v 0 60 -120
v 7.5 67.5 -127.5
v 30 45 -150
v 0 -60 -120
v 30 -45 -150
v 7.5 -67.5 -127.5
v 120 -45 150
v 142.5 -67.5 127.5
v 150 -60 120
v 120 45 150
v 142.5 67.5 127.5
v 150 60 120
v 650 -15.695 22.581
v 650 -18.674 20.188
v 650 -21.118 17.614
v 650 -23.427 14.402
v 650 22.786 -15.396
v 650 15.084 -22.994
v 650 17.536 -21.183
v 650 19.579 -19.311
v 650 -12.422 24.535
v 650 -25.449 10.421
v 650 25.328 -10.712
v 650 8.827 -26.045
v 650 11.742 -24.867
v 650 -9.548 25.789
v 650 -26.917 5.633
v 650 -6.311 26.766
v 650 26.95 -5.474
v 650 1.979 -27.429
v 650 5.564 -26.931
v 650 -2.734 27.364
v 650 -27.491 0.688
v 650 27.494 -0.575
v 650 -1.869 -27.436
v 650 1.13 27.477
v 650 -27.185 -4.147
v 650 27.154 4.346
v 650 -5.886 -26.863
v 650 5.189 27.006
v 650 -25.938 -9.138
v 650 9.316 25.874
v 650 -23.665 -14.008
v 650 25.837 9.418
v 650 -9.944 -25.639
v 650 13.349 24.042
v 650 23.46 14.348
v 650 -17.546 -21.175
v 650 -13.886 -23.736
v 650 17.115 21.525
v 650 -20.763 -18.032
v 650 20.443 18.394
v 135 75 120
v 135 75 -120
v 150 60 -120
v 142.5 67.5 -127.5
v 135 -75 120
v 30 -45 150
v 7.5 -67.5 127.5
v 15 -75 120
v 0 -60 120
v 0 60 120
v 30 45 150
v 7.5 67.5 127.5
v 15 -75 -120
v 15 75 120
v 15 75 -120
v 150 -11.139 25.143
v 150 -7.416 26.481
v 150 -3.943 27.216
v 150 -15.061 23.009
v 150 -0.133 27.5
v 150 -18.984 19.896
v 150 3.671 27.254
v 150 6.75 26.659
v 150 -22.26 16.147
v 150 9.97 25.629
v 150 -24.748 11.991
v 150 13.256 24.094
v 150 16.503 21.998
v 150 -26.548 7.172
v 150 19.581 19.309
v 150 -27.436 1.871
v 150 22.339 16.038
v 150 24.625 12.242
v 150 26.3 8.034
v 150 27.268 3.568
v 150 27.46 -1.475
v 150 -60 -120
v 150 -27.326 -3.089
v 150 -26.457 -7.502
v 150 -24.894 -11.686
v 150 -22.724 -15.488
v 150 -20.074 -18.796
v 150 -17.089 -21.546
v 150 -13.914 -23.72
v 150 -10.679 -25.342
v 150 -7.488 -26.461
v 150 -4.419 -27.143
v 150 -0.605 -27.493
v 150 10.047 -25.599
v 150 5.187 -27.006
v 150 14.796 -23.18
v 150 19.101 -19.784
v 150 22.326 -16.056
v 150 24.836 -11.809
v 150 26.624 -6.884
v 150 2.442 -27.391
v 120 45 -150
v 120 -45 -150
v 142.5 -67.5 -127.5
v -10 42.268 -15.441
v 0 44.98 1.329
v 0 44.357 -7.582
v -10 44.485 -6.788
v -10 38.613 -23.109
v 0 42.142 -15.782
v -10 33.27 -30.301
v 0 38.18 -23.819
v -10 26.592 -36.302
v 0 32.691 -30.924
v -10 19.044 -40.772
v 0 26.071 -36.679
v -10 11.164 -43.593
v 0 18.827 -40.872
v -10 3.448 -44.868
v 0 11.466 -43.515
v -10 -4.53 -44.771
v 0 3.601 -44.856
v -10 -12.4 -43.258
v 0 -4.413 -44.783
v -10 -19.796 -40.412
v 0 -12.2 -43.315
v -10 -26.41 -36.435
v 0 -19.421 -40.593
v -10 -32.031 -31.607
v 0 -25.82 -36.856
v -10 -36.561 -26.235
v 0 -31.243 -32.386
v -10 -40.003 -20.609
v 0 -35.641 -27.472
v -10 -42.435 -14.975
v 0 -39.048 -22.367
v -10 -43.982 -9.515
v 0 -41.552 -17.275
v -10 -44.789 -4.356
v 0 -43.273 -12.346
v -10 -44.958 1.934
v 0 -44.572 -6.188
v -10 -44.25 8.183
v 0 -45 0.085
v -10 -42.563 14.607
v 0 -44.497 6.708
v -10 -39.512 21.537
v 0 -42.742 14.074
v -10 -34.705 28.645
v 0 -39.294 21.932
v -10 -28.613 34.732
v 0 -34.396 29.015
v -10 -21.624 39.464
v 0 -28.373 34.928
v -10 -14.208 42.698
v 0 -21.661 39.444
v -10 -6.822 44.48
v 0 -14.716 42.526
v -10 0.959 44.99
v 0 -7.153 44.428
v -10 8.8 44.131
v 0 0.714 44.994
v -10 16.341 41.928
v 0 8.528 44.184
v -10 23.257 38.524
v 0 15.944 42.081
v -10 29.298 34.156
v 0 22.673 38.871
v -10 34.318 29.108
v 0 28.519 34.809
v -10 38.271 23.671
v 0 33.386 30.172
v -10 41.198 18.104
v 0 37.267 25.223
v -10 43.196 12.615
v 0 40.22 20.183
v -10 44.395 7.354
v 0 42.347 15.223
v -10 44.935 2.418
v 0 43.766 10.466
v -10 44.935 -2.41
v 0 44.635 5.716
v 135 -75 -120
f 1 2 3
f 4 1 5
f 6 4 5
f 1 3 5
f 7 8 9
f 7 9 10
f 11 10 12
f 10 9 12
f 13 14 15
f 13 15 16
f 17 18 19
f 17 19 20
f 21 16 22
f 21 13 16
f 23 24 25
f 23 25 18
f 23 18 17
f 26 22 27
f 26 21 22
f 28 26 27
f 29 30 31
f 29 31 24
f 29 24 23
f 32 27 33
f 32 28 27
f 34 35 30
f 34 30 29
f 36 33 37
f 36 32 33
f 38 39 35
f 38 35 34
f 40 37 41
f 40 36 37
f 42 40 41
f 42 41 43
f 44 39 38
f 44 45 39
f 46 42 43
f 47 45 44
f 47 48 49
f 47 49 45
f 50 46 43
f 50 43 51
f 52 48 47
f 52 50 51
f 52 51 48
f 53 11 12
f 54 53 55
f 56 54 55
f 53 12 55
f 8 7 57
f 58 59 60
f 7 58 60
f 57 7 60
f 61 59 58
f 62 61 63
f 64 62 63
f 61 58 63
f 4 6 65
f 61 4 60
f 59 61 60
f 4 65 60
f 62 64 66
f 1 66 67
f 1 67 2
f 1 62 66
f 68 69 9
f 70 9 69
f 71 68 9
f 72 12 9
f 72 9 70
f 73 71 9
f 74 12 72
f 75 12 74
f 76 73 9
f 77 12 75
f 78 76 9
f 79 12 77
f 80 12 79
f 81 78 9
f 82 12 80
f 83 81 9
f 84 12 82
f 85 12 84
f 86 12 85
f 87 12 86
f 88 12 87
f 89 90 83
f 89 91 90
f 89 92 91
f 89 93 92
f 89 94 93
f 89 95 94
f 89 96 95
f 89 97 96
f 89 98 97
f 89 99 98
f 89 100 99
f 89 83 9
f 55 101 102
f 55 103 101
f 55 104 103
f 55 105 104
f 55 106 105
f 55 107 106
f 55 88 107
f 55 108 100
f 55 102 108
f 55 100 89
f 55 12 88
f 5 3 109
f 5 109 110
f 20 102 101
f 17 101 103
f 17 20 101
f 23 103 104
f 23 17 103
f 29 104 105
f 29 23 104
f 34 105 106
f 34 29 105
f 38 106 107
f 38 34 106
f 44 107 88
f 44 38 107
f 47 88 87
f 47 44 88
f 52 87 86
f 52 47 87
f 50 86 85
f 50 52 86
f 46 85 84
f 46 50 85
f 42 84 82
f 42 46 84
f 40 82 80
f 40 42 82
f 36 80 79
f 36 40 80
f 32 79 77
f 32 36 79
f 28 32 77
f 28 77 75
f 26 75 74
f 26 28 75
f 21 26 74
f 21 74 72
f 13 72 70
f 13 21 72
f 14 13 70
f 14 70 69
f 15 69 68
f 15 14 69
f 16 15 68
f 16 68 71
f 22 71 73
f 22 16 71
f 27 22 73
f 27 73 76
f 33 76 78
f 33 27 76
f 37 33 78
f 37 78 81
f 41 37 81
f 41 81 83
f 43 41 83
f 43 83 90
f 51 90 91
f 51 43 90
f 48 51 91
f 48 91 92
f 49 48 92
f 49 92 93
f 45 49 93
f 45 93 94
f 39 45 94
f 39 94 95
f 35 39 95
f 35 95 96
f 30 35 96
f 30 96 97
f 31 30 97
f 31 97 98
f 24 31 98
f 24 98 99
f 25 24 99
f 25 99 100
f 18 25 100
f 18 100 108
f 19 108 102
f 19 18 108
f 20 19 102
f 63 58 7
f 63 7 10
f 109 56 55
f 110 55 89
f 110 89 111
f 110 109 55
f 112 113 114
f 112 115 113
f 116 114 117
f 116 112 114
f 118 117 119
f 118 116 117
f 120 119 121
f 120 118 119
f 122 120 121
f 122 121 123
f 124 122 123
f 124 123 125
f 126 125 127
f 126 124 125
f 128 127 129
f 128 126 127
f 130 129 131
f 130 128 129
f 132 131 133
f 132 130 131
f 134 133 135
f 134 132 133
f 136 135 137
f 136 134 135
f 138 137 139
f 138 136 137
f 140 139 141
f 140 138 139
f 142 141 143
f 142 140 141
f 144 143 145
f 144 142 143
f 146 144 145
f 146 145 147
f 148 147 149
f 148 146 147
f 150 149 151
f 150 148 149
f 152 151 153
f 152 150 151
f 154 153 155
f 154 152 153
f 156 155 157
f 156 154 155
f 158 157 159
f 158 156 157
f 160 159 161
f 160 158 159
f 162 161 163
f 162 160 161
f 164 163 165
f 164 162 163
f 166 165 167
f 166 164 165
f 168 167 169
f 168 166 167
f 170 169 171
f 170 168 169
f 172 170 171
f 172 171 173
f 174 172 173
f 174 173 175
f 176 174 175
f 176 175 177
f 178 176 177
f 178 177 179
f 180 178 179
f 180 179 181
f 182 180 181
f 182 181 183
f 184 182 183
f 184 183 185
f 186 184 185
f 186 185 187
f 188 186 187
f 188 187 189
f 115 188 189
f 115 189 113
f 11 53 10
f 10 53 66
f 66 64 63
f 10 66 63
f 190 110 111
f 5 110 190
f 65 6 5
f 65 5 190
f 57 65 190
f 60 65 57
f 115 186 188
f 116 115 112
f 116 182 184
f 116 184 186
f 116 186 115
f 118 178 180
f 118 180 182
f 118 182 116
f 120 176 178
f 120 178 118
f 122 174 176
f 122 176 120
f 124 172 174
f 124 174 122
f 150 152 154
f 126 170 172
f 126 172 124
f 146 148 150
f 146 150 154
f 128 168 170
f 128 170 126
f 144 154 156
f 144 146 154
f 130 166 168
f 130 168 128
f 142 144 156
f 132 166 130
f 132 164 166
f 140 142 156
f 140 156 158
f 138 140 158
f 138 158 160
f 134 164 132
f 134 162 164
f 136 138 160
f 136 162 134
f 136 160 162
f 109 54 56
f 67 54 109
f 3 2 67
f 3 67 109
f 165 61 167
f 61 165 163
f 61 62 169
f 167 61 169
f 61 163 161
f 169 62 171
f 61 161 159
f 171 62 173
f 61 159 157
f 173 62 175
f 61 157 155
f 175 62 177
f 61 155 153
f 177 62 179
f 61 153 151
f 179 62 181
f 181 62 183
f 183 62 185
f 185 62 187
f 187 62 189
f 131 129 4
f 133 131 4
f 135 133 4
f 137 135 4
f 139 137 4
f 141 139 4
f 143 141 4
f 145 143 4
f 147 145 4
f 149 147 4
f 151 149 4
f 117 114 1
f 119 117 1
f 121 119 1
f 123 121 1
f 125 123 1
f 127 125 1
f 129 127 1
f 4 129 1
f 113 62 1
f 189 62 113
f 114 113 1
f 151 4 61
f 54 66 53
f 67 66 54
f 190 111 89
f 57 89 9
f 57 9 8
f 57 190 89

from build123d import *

# Parameters (mm, degrees)
CHAFL_N2_SIZE = 30
CHAFL_N3_SIZE = 30
CHAFL_N4_SIZE = 30
CHAFL_N5_SIZE = 15


with BuildPart() as part:
    # Croquis3 → Recubrir1 section 0
    with BuildSketch(Plane(origin=(150, 0, 0), x_dir=(0, 0, -1), z_dir=(1, 0, 0))):
        with BuildLine():
            Line((-150, 75), (150, 75))
            Line((150, 75), (150, -75))
            Line((150, -75), (-150, -75))
            Line((-150, -75), (-150, 75))
        make_face()
    # Croquis2 → Recubrir1 section 1
    with BuildSketch(Plane(origin=(0, 0, 0), x_dir=(0, 0, -1), z_dir=(1, 0, 0))):
        with BuildLine():
            Line((-150, 75), (150, 75))
            Line((150, 75), (150, -75))
            Line((150, -75), (-150, -75))
            Line((-150, -75), (-150, 75))
        make_face()
    loft()

    # Recubrir2: read off the stored shape, not the designer's step
    # Recubrir2: loft between two sections, ruled curve by curve
    recubrir2_from = [
        Edge.make_bspline([(150, 5.186927484, -27.006402635), (150, 59.199732754, -16.632547667), (150, 48.825877786, 37.380257603), (150, -5.186927484, 27.006402635), (150, -59.199732754, 16.632547667), (150, -48.825877786, -37.380257603), (150, 5.186927484, -27.006402635)], [0, 0, 0, 0, 0.5, 0.5, 0.5, 1, 1, 1, 1], 3, [1, 0.333333333, 0.333333333, 1, 0.333333333, 0.333333333, 1]),
    ]
    recubrir2_to = [
        Edge.make_bspline([(650, 19.57936818, -19.310575902), (650, 58.200519984, 19.848160458), (650, 19.041783624, 58.469312262), (650, -19.57936818, 19.310575902), (650, -58.200519984, -19.848160458), (650, -19.041783624, -58.469312262), (650, 19.57936818, -19.310575902)], [0, 0, 0, 0, 0.5, 0.5, 0.5, 1, 1, 1, 1], 3, [1, 0.333333333, 0.333333333, 1, 0.333333333, 0.333333333, 1]),
    ]
    recubrir2 = Solid(Shell([*[Face.make_surface_from_curves(recubrir2_from[k], recubrir2_to[k]) for k in range(1)], Face(Wire(recubrir2_from)), Face(Wire(recubrir2_to))]))
    add(recubrir2)

    # Recubrir4: read off the stored shape, not the designer's step
    # Recubrir4: loft between two sections, ruled curve by curve
    recubrir4_from = [
        Edge.make_bspline([(0, 44.980379665, 1.328700551), (0, 47.637780767, -88.63205878), (0, -42.322978563, -91.289459882), (0, -44.980379665, -1.328700551), (0, -47.637780767, 88.63205878), (0, 42.322978563, 91.289459882), (0, 44.980379665, 1.328700551)], [0, 0, 0, 0, 0.5, 0.5, 0.5, 1, 1, 1, 1], 3, [1, 0.333333333, 0.333333333, 1, 0.333333333, 0.333333333, 1]),
    ]
    recubrir4_to = [
        Edge.make_bspline([(-10, 44.485072203, -6.788103644), (-10, 30.908864916, -95.75824805), (-10, -58.061279491, -82.182040763), (-10, -44.485072203, 6.788103644), (-10, -30.908864916, 95.75824805), (-10, 58.061279491, 82.182040763), (-10, 44.485072203, -6.788103644)], [0, 0, 0, 0, 0.5, 0.5, 0.5, 1, 1, 1, 1], 3, [1, 0.333333333, 0.333333333, 1, 0.333333333, 0.333333333, 1]),
    ]
    recubrir4 = Solid(Shell([*[Face.make_surface_from_curves(recubrir4_from[k], recubrir4_to[k]) for k in range(1)], Face(Wire(recubrir4_from)), Face(Wire(recubrir4_to))]))
    add(recubrir4)

    # Chaflán2
    chafl_n2_edges = [part.edges().sort_by_distance(p)[0] for p in [
        (75, -75, -150),
        (75, -75, 150),
        (75, 75, -150),
        (75, 75, 150),
    ]]
    chamfer(chafl_n2_edges, length=CHAFL_N2_SIZE)

    # Chaflán3
    chafl_n3_edges = [part.edges().sort_by_distance(p)[0] for p in [
        (0, 0, 150),
    ]]
    chamfer(chafl_n3_edges, length=CHAFL_N3_SIZE)

    # Chaflán4
    chafl_n4_edges = [part.edges().sort_by_distance(p)[0] for p in [
        (150, 0, -150),
        (0, 0, -150),
        (150, 0, 150),
    ]]
    chamfer(chafl_n4_edges, length=CHAFL_N4_SIZE)

    # Chaflán5
    chafl_n5_edges = [part.edges().sort_by_distance(p)[0] for p in [
        (0, 75, 0),
        (150, 75, 0),
        (150, -75, 0),
        (0, -75, 0),
    ]]
    chamfer(chafl_n5_edges, length=CHAFL_N5_SIZE)


solid = part.part
